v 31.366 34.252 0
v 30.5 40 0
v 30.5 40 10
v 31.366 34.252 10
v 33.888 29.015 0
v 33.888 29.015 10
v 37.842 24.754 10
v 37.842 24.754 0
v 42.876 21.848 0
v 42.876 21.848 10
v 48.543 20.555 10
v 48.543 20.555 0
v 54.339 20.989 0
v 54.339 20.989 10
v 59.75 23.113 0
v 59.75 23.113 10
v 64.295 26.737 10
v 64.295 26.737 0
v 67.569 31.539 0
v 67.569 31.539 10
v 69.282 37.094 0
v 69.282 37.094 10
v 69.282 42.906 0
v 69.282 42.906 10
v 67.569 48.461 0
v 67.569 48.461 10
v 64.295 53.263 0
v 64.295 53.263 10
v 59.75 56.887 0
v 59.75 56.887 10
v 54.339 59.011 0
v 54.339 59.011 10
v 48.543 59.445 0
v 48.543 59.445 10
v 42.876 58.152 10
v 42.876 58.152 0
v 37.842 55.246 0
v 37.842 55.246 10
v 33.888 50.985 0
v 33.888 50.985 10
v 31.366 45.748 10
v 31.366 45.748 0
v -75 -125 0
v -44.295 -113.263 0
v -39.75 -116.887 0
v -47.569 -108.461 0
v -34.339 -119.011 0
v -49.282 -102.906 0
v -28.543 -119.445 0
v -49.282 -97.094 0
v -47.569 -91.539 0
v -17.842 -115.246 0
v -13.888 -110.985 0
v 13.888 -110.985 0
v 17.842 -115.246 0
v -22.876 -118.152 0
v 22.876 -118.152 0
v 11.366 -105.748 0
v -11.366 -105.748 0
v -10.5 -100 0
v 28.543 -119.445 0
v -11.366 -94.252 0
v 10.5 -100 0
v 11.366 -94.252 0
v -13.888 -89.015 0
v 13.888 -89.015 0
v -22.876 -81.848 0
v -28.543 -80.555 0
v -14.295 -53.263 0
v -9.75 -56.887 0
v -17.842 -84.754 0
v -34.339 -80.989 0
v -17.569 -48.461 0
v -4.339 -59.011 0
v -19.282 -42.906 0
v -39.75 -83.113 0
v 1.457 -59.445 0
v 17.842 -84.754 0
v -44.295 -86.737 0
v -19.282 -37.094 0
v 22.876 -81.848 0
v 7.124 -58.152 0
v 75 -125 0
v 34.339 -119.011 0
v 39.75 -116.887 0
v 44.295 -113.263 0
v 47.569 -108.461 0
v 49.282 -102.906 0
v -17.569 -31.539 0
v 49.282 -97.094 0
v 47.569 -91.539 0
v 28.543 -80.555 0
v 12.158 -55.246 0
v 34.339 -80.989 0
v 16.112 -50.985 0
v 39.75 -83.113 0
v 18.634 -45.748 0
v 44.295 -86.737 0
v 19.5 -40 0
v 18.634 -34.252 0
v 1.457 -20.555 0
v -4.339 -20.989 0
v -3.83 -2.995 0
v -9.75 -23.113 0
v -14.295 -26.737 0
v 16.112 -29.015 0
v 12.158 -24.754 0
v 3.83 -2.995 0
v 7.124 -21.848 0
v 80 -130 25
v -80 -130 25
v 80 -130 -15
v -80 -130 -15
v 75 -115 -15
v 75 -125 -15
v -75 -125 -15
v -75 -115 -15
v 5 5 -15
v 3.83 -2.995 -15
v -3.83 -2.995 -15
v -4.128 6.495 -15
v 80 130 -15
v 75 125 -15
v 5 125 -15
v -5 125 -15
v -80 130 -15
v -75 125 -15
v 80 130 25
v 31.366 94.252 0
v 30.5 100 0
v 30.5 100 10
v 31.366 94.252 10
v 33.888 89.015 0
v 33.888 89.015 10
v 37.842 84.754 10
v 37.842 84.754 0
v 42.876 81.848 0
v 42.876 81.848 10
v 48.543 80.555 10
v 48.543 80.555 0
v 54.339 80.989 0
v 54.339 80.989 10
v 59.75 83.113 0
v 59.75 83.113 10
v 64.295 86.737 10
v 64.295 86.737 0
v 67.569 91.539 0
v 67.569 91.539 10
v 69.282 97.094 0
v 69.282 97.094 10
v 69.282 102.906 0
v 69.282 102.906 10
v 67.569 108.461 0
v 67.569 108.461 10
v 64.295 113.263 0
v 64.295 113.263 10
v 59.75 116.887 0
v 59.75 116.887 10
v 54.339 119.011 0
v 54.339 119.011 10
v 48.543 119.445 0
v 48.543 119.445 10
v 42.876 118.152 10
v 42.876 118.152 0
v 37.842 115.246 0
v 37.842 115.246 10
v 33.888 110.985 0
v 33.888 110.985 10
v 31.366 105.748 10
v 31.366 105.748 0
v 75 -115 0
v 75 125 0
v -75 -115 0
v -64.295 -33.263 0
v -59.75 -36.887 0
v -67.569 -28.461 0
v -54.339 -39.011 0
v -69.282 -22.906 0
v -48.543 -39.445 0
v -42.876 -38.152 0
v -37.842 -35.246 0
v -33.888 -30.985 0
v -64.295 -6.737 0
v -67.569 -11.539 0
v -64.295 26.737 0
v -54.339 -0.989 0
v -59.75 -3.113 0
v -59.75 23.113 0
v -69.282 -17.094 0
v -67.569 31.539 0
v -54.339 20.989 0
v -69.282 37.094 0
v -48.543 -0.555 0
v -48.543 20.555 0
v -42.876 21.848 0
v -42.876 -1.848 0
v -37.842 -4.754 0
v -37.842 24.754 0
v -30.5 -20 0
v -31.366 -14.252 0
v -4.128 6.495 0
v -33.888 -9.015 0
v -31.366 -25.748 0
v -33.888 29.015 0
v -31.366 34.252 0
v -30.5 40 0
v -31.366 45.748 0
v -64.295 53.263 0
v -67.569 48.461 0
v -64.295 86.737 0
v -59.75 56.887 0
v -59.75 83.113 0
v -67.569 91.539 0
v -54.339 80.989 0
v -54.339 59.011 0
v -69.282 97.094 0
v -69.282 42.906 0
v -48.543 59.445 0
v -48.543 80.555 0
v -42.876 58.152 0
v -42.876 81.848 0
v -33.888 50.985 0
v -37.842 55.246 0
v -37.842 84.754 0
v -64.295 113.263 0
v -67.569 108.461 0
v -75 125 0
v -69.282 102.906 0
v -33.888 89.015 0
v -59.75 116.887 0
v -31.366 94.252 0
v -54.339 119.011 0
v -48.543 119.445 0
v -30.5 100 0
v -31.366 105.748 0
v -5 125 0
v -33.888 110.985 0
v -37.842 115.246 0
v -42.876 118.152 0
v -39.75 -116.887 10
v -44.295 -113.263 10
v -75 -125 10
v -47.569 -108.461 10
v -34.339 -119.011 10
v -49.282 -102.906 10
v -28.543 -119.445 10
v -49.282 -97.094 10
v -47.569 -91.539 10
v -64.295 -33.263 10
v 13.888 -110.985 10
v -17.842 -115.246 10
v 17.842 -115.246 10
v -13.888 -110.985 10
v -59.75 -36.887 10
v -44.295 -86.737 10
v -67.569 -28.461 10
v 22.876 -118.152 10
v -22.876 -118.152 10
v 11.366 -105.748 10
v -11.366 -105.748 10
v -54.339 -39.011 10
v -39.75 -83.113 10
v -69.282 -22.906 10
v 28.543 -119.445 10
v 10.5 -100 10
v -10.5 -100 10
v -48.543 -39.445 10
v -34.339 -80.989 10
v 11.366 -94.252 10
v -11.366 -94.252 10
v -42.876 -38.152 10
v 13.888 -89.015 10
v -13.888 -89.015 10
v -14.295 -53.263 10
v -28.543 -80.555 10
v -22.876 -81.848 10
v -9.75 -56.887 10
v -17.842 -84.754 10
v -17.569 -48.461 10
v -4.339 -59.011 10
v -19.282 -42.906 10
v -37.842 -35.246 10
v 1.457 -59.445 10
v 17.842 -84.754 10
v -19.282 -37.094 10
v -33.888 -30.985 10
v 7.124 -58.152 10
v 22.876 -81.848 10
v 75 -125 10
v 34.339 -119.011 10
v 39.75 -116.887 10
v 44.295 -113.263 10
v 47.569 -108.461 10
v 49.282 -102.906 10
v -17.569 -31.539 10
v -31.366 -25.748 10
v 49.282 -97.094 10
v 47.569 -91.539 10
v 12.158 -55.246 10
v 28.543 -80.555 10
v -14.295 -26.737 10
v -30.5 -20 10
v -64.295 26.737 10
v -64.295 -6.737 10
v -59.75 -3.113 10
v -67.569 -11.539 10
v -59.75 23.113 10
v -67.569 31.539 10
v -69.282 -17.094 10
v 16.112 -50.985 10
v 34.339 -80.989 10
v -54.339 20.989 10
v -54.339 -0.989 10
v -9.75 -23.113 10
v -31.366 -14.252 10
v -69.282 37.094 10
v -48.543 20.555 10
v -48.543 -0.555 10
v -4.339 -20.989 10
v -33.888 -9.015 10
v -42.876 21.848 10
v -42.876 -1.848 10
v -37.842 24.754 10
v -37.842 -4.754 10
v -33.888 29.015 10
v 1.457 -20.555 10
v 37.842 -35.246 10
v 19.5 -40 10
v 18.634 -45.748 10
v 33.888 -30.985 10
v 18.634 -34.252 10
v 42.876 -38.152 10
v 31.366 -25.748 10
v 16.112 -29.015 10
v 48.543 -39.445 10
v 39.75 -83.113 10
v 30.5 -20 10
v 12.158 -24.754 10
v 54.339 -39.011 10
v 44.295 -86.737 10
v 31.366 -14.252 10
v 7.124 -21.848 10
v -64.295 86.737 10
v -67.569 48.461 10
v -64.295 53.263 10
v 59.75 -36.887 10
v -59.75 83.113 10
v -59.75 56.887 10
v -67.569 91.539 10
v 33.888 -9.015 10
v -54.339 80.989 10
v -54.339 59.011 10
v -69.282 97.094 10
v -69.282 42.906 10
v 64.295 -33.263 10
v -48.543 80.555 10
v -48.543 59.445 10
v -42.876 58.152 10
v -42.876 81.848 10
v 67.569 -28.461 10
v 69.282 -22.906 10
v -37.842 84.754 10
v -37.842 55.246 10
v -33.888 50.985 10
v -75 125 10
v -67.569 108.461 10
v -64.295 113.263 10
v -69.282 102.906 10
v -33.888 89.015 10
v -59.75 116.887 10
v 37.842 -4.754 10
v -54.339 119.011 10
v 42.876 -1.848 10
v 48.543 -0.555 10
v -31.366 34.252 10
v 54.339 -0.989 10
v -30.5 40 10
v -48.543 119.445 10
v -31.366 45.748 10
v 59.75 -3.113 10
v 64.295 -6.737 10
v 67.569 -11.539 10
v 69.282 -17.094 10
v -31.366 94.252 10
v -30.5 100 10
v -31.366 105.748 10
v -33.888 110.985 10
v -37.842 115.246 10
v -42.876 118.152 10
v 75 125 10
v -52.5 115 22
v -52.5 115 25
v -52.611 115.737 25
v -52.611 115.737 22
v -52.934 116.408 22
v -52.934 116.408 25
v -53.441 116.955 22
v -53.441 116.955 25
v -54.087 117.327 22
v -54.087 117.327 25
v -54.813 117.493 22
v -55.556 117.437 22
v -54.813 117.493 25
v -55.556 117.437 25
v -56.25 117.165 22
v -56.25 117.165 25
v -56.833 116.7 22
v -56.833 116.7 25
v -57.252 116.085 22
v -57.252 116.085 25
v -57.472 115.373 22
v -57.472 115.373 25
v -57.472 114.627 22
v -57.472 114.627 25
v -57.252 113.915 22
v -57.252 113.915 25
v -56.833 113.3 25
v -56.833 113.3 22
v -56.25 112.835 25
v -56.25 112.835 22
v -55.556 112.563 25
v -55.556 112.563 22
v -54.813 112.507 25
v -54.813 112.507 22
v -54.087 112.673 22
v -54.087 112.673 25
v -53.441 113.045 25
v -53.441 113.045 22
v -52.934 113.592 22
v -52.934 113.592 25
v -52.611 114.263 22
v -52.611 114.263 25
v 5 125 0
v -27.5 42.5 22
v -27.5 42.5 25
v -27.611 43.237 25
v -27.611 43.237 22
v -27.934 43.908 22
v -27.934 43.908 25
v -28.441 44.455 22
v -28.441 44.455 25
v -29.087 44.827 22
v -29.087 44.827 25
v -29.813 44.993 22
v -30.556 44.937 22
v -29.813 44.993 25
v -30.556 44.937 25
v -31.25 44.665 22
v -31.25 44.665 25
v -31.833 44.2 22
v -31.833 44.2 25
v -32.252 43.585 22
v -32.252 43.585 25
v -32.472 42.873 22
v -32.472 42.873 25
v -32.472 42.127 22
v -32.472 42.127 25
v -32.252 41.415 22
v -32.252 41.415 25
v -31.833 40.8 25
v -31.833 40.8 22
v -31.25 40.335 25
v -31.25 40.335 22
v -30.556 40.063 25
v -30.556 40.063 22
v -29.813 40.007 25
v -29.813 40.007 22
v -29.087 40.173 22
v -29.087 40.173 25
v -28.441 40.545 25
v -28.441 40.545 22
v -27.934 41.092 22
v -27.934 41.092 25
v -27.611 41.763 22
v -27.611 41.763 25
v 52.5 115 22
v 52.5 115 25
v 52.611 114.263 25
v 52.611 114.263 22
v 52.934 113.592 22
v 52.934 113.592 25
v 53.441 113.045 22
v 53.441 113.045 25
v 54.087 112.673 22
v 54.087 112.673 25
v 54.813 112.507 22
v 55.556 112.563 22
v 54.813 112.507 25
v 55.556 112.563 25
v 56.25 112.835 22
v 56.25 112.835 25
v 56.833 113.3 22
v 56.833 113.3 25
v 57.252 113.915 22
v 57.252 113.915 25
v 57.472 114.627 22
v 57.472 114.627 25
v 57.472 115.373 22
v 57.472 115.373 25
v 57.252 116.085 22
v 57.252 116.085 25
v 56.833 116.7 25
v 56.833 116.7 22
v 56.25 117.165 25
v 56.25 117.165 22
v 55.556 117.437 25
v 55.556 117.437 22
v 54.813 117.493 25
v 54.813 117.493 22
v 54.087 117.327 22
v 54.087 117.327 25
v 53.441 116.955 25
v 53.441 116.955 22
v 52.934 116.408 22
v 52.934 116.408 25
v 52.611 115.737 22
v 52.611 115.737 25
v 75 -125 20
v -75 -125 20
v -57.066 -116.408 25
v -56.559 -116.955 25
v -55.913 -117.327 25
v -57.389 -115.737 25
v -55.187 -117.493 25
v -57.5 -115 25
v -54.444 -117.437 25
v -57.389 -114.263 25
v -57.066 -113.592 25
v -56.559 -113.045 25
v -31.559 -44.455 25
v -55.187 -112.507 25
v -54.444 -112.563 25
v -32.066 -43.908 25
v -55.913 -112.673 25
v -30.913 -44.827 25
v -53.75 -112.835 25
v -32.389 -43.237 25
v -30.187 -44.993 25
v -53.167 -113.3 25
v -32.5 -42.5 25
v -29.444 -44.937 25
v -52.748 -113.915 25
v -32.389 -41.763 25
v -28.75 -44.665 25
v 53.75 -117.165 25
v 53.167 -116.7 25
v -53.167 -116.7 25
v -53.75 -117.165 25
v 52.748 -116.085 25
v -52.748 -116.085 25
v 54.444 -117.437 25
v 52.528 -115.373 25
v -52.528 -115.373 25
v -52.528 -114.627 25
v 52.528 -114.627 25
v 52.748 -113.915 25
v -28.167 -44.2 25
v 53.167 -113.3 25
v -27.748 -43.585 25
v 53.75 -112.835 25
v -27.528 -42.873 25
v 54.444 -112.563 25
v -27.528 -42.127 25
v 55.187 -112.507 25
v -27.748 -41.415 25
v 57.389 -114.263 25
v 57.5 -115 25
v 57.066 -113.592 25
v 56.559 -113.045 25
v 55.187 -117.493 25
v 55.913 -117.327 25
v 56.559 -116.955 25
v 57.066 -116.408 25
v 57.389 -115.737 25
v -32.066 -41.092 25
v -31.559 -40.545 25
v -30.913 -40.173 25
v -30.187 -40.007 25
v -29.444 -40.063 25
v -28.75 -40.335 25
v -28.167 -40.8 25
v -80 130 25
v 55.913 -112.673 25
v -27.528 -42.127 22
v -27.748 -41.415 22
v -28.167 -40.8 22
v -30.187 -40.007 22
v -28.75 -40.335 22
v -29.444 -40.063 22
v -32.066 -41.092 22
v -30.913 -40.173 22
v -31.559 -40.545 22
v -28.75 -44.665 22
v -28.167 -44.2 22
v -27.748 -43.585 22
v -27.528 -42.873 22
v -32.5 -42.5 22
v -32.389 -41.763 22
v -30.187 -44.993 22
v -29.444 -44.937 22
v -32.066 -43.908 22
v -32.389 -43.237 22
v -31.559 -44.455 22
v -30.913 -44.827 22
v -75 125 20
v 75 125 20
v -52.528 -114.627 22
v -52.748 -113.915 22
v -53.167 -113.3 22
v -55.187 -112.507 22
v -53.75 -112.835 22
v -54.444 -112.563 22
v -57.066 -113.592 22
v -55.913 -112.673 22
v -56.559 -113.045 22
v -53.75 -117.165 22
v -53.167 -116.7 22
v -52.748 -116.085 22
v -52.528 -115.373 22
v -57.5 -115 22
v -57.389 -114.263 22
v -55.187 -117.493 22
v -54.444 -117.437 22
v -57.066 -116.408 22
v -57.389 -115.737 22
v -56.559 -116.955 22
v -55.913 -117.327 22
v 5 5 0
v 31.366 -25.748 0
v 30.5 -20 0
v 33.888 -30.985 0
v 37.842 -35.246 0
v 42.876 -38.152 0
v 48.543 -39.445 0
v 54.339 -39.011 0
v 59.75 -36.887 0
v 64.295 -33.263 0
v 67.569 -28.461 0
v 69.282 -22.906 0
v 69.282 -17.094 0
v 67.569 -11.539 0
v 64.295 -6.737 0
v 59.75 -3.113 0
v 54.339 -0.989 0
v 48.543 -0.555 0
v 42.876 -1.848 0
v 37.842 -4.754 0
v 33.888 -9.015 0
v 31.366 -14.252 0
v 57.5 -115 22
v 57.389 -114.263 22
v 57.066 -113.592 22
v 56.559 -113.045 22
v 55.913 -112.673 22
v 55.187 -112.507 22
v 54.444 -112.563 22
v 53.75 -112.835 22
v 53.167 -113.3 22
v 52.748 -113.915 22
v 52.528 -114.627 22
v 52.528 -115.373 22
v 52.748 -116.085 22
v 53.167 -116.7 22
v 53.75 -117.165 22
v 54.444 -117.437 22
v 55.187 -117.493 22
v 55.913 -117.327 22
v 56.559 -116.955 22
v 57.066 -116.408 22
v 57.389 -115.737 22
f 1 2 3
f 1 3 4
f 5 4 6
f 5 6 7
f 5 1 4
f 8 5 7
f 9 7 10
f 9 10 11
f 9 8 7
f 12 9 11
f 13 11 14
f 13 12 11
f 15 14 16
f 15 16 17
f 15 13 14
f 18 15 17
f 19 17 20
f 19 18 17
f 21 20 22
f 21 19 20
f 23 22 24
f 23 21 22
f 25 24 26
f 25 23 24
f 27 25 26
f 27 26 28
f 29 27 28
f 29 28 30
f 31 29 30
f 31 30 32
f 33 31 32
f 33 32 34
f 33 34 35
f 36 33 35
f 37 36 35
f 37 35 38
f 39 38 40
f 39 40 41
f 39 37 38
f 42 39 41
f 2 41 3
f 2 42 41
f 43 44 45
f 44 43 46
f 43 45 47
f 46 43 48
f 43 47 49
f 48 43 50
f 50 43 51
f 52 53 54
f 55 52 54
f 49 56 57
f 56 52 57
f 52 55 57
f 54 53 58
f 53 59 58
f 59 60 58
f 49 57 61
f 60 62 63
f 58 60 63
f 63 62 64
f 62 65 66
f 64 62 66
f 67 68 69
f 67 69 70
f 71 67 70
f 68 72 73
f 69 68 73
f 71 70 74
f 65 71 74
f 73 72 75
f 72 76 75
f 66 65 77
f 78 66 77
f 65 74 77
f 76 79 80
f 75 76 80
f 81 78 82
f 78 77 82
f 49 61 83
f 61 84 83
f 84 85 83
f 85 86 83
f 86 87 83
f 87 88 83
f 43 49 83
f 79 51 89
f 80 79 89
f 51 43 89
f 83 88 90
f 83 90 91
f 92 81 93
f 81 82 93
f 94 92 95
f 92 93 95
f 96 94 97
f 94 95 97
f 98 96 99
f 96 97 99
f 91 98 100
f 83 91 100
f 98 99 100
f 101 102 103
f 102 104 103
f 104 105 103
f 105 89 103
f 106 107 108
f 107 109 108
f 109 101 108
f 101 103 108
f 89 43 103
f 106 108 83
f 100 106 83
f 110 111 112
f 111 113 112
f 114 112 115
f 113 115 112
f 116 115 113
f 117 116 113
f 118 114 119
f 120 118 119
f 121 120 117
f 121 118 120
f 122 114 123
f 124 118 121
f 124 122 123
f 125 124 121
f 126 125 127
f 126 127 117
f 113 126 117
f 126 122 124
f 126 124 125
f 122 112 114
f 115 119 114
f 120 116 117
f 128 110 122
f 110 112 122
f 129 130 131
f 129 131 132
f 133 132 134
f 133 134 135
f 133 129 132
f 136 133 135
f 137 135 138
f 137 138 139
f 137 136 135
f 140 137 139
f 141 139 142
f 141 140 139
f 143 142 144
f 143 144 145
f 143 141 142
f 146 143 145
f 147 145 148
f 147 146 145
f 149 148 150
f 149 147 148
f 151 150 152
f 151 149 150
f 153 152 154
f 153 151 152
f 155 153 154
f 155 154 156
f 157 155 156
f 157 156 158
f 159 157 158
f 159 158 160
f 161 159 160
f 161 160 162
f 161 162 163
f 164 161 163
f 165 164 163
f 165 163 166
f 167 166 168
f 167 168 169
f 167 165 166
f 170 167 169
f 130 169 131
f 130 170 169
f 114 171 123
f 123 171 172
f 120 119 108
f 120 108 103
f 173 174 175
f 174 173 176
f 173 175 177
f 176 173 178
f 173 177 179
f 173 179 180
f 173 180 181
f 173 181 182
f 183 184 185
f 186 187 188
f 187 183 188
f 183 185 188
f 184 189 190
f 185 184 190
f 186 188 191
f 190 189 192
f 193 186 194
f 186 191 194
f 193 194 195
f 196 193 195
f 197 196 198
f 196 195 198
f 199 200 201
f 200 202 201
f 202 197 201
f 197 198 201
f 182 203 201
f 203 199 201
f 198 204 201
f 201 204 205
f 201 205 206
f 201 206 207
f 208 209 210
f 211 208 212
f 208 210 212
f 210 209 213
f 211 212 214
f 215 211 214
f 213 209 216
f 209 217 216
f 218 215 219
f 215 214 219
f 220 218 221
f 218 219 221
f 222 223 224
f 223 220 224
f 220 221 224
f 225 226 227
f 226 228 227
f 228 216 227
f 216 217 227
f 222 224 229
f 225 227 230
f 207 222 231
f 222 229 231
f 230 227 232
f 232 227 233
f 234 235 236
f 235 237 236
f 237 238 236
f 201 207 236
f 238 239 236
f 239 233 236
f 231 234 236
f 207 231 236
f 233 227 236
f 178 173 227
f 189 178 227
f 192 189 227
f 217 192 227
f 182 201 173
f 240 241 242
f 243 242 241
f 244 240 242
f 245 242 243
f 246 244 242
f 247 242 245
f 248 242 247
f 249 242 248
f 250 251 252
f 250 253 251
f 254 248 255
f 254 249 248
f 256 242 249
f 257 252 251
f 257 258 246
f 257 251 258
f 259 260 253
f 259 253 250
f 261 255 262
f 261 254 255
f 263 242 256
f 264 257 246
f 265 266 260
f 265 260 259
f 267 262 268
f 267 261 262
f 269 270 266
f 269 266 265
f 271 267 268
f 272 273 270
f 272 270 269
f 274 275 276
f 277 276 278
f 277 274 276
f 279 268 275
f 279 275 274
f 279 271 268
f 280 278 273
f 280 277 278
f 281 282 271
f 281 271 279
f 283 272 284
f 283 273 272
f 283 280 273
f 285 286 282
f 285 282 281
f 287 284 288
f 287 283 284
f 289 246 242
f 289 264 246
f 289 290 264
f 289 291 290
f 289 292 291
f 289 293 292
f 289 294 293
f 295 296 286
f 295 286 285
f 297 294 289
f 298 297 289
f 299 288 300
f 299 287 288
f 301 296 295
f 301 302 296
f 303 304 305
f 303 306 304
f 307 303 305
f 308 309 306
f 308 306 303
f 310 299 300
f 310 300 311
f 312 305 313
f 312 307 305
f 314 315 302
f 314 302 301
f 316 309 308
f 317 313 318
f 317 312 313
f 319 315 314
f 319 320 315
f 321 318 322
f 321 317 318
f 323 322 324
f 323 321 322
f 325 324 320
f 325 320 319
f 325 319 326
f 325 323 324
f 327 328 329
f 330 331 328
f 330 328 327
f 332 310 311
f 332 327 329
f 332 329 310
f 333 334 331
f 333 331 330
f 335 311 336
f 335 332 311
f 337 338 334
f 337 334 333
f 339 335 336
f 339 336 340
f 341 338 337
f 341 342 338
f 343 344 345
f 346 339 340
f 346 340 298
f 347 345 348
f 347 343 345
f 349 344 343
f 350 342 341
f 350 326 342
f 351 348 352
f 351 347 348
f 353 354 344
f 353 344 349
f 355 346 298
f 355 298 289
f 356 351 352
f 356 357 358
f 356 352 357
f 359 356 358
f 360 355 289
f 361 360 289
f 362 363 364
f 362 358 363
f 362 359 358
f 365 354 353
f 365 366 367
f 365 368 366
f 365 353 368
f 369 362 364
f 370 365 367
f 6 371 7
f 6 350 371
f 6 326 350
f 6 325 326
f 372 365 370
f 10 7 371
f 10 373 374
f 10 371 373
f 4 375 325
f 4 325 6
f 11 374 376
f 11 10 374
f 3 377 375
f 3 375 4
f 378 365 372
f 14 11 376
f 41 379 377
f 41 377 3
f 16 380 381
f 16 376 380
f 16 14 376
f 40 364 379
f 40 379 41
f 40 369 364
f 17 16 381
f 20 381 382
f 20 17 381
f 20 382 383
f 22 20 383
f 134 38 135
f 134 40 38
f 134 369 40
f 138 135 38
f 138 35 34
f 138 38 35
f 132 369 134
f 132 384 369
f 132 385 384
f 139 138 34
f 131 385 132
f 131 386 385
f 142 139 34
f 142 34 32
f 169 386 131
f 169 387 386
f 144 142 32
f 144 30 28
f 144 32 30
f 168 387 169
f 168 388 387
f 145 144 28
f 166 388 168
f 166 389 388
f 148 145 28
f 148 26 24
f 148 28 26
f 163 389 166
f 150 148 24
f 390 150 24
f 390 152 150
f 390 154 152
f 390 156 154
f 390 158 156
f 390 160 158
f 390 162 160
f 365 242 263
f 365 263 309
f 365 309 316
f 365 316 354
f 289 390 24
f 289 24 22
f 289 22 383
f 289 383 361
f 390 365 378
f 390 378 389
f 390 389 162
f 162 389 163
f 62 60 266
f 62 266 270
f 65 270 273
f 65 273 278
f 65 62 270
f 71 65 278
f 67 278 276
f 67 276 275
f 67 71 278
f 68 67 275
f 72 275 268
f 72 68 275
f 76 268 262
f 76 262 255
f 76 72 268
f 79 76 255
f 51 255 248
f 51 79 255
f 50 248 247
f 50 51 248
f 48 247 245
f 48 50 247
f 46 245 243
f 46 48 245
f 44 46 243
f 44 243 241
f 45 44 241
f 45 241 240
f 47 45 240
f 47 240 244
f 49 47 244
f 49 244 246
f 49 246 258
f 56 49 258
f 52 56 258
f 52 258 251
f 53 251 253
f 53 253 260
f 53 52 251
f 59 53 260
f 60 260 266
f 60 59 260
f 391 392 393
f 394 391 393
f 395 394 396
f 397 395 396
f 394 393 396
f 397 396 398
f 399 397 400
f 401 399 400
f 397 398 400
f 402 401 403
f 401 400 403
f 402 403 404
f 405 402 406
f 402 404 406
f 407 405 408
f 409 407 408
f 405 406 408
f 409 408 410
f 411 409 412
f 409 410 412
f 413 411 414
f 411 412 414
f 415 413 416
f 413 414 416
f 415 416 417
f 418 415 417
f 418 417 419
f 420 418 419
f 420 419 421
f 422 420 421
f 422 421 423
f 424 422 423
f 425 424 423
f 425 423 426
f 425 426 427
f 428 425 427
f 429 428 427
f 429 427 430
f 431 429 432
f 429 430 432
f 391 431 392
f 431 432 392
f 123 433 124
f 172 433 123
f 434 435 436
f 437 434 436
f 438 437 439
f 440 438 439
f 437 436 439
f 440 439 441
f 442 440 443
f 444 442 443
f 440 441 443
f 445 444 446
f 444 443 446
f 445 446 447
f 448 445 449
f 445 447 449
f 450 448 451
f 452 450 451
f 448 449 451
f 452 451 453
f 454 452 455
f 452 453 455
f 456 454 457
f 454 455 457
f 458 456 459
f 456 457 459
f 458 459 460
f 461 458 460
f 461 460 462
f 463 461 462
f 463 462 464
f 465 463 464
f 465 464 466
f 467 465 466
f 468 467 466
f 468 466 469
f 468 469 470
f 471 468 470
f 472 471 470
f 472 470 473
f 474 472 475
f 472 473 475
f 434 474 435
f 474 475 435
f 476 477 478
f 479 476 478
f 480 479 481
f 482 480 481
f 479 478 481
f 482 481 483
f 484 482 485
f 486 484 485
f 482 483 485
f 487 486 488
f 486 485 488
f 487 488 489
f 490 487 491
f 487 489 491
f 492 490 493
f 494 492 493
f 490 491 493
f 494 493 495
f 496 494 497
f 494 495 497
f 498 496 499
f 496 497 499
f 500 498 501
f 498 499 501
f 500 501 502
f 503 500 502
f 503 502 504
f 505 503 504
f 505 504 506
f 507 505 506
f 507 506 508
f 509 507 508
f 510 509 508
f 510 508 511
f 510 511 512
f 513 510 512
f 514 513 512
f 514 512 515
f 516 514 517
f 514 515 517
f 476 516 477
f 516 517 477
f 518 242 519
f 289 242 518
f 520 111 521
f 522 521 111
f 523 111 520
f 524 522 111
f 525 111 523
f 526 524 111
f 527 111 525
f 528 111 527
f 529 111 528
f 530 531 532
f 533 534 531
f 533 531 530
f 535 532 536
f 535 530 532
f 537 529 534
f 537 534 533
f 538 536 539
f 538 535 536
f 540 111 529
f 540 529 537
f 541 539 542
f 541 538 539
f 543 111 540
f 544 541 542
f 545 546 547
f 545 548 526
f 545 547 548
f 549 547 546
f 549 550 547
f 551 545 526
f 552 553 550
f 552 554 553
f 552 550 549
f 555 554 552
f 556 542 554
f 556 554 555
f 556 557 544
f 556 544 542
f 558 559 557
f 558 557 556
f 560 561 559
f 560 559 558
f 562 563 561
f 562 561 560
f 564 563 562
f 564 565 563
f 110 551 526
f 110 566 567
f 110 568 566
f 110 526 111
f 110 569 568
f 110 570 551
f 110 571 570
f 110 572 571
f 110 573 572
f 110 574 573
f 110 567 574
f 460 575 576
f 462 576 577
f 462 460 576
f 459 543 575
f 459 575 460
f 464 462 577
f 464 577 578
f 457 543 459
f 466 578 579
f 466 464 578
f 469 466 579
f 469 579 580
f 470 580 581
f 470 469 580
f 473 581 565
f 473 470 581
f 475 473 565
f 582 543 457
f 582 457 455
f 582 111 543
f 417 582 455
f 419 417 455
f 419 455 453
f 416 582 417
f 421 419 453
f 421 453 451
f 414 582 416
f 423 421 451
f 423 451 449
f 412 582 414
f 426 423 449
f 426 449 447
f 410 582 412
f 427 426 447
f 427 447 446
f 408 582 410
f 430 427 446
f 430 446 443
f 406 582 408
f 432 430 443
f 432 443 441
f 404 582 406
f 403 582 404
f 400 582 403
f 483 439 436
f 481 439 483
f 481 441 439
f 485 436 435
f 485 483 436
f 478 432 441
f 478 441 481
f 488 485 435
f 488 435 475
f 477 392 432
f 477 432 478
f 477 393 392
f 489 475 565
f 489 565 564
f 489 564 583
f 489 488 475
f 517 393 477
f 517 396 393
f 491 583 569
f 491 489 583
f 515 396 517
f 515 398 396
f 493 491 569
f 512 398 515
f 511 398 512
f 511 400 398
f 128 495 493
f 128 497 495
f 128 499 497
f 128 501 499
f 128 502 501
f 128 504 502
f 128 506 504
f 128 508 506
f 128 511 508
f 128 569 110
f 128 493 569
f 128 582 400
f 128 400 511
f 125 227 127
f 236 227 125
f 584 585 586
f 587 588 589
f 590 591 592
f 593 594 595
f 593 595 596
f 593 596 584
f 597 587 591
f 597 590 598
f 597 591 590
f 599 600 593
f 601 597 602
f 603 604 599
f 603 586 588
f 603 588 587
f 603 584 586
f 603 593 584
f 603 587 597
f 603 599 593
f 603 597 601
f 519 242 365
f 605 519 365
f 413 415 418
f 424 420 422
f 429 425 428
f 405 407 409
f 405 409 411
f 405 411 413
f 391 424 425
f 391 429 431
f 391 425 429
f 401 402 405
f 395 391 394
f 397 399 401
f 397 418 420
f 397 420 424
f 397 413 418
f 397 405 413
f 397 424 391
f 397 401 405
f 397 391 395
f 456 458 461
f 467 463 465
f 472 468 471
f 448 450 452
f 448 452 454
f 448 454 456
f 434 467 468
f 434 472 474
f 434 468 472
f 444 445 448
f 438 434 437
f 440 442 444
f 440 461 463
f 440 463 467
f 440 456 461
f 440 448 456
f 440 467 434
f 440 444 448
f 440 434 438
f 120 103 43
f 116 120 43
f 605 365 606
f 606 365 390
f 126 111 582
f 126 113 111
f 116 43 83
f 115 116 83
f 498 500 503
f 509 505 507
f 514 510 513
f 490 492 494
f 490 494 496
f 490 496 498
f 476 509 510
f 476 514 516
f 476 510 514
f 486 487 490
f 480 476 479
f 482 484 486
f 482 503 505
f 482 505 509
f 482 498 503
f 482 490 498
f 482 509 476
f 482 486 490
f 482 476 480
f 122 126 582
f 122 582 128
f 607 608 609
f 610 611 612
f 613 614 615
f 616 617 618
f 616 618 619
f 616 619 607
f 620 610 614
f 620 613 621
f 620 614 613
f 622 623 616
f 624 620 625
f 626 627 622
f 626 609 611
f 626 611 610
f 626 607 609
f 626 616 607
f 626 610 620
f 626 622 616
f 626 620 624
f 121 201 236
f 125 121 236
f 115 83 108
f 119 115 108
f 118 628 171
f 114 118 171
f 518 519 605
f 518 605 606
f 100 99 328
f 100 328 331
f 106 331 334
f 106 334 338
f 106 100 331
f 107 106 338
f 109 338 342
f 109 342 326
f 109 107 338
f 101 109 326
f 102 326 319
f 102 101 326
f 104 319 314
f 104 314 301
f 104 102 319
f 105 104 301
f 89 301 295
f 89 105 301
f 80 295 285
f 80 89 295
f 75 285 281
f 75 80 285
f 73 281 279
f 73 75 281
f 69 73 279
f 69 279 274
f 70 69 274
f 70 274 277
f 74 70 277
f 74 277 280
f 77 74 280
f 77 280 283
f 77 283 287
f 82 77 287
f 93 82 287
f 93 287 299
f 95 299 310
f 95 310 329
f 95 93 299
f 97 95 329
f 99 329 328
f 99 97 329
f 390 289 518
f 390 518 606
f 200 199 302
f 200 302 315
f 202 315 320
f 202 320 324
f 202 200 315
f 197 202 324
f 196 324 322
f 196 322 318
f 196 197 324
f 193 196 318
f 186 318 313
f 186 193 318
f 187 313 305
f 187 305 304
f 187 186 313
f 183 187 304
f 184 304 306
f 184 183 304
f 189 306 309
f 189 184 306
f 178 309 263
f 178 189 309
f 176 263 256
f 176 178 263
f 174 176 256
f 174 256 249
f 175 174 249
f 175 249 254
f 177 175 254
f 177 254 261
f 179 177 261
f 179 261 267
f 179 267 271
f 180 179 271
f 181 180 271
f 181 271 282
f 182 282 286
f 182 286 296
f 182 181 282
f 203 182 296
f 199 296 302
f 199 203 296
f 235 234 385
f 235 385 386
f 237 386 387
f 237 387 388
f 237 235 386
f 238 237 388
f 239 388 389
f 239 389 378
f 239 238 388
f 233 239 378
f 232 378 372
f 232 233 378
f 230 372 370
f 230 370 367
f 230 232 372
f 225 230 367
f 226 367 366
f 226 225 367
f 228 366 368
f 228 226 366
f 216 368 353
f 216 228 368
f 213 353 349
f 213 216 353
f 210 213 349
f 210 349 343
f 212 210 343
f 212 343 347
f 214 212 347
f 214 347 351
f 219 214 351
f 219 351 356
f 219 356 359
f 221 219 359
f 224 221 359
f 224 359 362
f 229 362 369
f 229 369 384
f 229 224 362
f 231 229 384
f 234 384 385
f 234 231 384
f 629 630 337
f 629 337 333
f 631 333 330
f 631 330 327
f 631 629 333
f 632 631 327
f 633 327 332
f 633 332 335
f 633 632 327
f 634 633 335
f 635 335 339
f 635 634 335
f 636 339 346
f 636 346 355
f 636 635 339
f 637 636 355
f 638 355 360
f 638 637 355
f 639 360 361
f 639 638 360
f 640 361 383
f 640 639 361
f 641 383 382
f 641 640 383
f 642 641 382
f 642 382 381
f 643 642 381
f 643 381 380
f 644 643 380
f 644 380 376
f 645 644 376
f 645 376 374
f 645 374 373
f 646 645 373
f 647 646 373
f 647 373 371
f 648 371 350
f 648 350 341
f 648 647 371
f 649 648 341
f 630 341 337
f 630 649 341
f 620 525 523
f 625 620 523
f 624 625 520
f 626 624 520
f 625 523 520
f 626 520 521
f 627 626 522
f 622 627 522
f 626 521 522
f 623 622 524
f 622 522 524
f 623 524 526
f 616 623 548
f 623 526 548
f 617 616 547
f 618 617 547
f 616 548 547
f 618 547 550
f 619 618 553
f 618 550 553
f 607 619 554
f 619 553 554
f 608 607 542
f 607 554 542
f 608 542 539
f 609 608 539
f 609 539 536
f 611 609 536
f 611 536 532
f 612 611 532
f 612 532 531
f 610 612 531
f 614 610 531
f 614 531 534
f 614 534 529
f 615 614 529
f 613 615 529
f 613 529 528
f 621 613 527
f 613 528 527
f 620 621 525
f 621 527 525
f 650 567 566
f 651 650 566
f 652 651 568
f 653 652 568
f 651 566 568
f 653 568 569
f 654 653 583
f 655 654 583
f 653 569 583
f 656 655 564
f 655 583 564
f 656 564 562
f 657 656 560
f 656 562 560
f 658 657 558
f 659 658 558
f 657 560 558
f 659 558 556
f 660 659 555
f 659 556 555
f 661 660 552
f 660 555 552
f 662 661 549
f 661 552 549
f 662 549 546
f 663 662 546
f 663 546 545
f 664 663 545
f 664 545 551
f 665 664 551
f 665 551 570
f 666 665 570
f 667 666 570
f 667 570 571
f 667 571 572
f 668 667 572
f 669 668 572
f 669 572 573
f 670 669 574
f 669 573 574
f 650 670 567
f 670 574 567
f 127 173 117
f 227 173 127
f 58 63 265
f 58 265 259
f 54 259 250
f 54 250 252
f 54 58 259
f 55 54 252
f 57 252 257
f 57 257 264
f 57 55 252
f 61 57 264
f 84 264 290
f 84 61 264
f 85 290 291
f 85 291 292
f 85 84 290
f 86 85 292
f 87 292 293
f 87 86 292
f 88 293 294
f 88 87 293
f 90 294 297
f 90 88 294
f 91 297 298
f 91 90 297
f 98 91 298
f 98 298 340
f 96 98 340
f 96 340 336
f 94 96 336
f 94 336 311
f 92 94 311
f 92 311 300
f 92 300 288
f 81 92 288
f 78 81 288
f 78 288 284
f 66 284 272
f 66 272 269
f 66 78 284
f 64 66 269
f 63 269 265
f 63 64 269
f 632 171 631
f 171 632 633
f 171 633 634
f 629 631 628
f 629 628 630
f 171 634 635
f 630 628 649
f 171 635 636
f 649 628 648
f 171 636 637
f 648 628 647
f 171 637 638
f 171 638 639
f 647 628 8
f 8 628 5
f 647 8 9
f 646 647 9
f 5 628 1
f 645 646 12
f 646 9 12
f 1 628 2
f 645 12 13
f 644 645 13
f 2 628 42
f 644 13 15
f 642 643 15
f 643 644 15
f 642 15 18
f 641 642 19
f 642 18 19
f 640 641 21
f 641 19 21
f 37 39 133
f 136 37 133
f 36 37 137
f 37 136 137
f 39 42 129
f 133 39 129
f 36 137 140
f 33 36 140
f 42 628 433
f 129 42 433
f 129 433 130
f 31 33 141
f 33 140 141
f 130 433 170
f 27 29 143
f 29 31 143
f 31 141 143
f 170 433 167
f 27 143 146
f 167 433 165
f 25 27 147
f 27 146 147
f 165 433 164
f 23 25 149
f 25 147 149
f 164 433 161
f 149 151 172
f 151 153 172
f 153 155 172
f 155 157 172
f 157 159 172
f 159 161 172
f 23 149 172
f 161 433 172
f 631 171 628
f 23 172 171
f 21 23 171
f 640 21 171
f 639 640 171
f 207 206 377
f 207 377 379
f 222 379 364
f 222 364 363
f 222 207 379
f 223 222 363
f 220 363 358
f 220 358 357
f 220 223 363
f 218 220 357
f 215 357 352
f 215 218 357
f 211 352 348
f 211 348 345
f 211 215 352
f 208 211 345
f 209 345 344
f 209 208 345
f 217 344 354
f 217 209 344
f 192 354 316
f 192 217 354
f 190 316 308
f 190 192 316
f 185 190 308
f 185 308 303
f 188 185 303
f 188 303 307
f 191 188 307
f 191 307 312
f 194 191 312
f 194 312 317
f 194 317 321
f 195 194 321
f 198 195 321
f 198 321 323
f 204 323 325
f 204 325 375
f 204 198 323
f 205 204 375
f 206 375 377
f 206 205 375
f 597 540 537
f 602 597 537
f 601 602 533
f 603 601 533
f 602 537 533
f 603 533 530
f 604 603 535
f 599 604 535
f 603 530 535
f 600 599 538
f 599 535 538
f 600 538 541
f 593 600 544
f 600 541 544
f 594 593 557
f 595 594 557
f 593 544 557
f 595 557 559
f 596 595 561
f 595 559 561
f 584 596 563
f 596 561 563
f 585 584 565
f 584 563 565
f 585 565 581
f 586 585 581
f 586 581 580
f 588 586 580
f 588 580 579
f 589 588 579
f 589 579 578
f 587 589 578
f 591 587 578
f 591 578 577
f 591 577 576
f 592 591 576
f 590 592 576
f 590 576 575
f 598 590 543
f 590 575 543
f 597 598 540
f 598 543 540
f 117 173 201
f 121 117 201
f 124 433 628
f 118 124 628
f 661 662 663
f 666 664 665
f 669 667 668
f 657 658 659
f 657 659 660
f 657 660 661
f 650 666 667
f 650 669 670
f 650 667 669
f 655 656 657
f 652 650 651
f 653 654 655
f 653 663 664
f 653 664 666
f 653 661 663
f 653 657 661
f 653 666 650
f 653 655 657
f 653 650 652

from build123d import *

# Parameters (mm, degrees)
CROQUIS1_W              = 150
CROQUIS1_H              = 250
CROQUIS1_R              = 19.5
SALIENTE_EXTRUIR1_DEPTH = 10
CROQUIS3_W              = 160
CROQUIS3_H              = 260
CROQUIS3_W_2            = 150
CROQUIS3_H_2            = 250
SALIENTE_EXTRUIR2_DEPTH = 25
SALIENTE_EXTRUIR3_DEPTH = 15
CROQUIS6_W              = 160
CROQUIS6_H              = 260
CROQUIS6_W_2            = 150
CROQUIS6_H_2            = 250
SALIENTE_EXTRUIR4_DEPTH = 15
CROQUIS7_W              = 160
CROQUIS7_H              = 260
SALIENTE_EXTRUIR5_DEPTH = 5
CROQUIS8_R              = 2.5
CORTAR_EXTRUIR1_DEPTH   = 3
CROQUIS9_R              = 2.5
CORTAR_EXTRUIR2_DEPTH   = 3


with BuildPart() as part:
    # Croquis1 → Saliente-Extruir1 (new body)
    with BuildSketch(Plane.XY):
        Rectangle(CROQUIS1_W, CROQUIS1_H)
        with Locations((-50, 100)):
            Circle(CROQUIS1_R, mode=Mode.SUBTRACT)
        with Locations((-50, 40)):
            Circle(CROQUIS1_R, mode=Mode.SUBTRACT)
        with Locations((-50, -20)):
            Circle(CROQUIS1_R, mode=Mode.SUBTRACT)
        with Locations(Location((50, -20, 0), (0, 0, 180))):
            Circle(CROQUIS1_R, mode=Mode.SUBTRACT)
        with Locations(Location((50, 40, 0), (0, 0, 180))):
            Circle(CROQUIS1_R, mode=Mode.SUBTRACT)
        with Locations(Location((50, 100, 0), (0, 0, 180))):
            Circle(CROQUIS1_R, mode=Mode.SUBTRACT)
        with Locations((-30, -100)):
            Circle(CROQUIS1_R, mode=Mode.SUBTRACT)
        with Locations(Location((30, -100, 0), (0, 0, 180))):
            Circle(CROQUIS1_R, mode=Mode.SUBTRACT)
        with Locations((0, -40)):
            Circle(CROQUIS1_R, mode=Mode.SUBTRACT)
    extrude(amount=SALIENTE_EXTRUIR1_DEPTH)

    # Croquis3 → Saliente-Extruir2 (add)
    with BuildSketch(Plane.XY.offset(10)):
        Rectangle(CROQUIS3_W, CROQUIS3_H)
        Rectangle(CROQUIS3_W_2, CROQUIS3_H_2, mode=Mode.SUBTRACT)
    extrude(amount=-SALIENTE_EXTRUIR2_DEPTH)

    # Croquis4 → Saliente-Extruir3 (add)
    with BuildSketch(Plane(origin=(0, 0, 0), x_dir=(-1, 0, 0), z_dir=(0, 0, -1))):
        Polygon((-5, 125), (-5, 5), (-75, -115), (-75, -125), (-3.830215177, -2.994654589), (3.830215177, -2.994654589), (75, -125), (75, -115), (4.127714662, 6.495346294), (5, 125), align=None)
    extrude(amount=SALIENTE_EXTRUIR3_DEPTH)

    # Croquis6 → Saliente-Extruir4 (add)
    with BuildSketch(Plane.XY.offset(10)):
        Rectangle(CROQUIS6_W, CROQUIS6_H)
        Rectangle(CROQUIS6_W_2, CROQUIS6_H_2, mode=Mode.SUBTRACT)
    extrude(amount=SALIENTE_EXTRUIR4_DEPTH)

    # Croquis7 → Saliente-Extruir5 (add)
    with BuildSketch(Plane.XY.offset(25)):
        Rectangle(CROQUIS7_W, CROQUIS7_H)
    extrude(amount=-SALIENTE_EXTRUIR5_DEPTH)

    # Croquis8 → Cortar-Extruir1 (cut)
    with BuildSketch(Plane.XY.offset(25)):
        with Locations((-30, 42.5)):
            Circle(CROQUIS8_R)
        with Locations(Location((-30, -42.5, 0), (0, 0, 180))):
            Circle(CROQUIS8_R)
    extrude(amount=-CORTAR_EXTRUIR1_DEPTH, mode=Mode.SUBTRACT)

    # Croquis9 → Cortar-Extruir2 (cut)
    with BuildSketch(Plane.XY.offset(25)):
        with Locations((-55, 115)):
            Circle(CROQUIS9_R)
        with Locations(Location((55, 115, 0), (0, 0, 180))):
            Circle(CROQUIS9_R)
        with Locations((55, -115)):
            Circle(CROQUIS9_R)
        with Locations(Location((-55, -115, 0), (0, 0, 180))):
            Circle(CROQUIS9_R)
    extrude(amount=-CORTAR_EXTRUIR2_DEPTH, mode=Mode.SUBTRACT)


solid = part.part
